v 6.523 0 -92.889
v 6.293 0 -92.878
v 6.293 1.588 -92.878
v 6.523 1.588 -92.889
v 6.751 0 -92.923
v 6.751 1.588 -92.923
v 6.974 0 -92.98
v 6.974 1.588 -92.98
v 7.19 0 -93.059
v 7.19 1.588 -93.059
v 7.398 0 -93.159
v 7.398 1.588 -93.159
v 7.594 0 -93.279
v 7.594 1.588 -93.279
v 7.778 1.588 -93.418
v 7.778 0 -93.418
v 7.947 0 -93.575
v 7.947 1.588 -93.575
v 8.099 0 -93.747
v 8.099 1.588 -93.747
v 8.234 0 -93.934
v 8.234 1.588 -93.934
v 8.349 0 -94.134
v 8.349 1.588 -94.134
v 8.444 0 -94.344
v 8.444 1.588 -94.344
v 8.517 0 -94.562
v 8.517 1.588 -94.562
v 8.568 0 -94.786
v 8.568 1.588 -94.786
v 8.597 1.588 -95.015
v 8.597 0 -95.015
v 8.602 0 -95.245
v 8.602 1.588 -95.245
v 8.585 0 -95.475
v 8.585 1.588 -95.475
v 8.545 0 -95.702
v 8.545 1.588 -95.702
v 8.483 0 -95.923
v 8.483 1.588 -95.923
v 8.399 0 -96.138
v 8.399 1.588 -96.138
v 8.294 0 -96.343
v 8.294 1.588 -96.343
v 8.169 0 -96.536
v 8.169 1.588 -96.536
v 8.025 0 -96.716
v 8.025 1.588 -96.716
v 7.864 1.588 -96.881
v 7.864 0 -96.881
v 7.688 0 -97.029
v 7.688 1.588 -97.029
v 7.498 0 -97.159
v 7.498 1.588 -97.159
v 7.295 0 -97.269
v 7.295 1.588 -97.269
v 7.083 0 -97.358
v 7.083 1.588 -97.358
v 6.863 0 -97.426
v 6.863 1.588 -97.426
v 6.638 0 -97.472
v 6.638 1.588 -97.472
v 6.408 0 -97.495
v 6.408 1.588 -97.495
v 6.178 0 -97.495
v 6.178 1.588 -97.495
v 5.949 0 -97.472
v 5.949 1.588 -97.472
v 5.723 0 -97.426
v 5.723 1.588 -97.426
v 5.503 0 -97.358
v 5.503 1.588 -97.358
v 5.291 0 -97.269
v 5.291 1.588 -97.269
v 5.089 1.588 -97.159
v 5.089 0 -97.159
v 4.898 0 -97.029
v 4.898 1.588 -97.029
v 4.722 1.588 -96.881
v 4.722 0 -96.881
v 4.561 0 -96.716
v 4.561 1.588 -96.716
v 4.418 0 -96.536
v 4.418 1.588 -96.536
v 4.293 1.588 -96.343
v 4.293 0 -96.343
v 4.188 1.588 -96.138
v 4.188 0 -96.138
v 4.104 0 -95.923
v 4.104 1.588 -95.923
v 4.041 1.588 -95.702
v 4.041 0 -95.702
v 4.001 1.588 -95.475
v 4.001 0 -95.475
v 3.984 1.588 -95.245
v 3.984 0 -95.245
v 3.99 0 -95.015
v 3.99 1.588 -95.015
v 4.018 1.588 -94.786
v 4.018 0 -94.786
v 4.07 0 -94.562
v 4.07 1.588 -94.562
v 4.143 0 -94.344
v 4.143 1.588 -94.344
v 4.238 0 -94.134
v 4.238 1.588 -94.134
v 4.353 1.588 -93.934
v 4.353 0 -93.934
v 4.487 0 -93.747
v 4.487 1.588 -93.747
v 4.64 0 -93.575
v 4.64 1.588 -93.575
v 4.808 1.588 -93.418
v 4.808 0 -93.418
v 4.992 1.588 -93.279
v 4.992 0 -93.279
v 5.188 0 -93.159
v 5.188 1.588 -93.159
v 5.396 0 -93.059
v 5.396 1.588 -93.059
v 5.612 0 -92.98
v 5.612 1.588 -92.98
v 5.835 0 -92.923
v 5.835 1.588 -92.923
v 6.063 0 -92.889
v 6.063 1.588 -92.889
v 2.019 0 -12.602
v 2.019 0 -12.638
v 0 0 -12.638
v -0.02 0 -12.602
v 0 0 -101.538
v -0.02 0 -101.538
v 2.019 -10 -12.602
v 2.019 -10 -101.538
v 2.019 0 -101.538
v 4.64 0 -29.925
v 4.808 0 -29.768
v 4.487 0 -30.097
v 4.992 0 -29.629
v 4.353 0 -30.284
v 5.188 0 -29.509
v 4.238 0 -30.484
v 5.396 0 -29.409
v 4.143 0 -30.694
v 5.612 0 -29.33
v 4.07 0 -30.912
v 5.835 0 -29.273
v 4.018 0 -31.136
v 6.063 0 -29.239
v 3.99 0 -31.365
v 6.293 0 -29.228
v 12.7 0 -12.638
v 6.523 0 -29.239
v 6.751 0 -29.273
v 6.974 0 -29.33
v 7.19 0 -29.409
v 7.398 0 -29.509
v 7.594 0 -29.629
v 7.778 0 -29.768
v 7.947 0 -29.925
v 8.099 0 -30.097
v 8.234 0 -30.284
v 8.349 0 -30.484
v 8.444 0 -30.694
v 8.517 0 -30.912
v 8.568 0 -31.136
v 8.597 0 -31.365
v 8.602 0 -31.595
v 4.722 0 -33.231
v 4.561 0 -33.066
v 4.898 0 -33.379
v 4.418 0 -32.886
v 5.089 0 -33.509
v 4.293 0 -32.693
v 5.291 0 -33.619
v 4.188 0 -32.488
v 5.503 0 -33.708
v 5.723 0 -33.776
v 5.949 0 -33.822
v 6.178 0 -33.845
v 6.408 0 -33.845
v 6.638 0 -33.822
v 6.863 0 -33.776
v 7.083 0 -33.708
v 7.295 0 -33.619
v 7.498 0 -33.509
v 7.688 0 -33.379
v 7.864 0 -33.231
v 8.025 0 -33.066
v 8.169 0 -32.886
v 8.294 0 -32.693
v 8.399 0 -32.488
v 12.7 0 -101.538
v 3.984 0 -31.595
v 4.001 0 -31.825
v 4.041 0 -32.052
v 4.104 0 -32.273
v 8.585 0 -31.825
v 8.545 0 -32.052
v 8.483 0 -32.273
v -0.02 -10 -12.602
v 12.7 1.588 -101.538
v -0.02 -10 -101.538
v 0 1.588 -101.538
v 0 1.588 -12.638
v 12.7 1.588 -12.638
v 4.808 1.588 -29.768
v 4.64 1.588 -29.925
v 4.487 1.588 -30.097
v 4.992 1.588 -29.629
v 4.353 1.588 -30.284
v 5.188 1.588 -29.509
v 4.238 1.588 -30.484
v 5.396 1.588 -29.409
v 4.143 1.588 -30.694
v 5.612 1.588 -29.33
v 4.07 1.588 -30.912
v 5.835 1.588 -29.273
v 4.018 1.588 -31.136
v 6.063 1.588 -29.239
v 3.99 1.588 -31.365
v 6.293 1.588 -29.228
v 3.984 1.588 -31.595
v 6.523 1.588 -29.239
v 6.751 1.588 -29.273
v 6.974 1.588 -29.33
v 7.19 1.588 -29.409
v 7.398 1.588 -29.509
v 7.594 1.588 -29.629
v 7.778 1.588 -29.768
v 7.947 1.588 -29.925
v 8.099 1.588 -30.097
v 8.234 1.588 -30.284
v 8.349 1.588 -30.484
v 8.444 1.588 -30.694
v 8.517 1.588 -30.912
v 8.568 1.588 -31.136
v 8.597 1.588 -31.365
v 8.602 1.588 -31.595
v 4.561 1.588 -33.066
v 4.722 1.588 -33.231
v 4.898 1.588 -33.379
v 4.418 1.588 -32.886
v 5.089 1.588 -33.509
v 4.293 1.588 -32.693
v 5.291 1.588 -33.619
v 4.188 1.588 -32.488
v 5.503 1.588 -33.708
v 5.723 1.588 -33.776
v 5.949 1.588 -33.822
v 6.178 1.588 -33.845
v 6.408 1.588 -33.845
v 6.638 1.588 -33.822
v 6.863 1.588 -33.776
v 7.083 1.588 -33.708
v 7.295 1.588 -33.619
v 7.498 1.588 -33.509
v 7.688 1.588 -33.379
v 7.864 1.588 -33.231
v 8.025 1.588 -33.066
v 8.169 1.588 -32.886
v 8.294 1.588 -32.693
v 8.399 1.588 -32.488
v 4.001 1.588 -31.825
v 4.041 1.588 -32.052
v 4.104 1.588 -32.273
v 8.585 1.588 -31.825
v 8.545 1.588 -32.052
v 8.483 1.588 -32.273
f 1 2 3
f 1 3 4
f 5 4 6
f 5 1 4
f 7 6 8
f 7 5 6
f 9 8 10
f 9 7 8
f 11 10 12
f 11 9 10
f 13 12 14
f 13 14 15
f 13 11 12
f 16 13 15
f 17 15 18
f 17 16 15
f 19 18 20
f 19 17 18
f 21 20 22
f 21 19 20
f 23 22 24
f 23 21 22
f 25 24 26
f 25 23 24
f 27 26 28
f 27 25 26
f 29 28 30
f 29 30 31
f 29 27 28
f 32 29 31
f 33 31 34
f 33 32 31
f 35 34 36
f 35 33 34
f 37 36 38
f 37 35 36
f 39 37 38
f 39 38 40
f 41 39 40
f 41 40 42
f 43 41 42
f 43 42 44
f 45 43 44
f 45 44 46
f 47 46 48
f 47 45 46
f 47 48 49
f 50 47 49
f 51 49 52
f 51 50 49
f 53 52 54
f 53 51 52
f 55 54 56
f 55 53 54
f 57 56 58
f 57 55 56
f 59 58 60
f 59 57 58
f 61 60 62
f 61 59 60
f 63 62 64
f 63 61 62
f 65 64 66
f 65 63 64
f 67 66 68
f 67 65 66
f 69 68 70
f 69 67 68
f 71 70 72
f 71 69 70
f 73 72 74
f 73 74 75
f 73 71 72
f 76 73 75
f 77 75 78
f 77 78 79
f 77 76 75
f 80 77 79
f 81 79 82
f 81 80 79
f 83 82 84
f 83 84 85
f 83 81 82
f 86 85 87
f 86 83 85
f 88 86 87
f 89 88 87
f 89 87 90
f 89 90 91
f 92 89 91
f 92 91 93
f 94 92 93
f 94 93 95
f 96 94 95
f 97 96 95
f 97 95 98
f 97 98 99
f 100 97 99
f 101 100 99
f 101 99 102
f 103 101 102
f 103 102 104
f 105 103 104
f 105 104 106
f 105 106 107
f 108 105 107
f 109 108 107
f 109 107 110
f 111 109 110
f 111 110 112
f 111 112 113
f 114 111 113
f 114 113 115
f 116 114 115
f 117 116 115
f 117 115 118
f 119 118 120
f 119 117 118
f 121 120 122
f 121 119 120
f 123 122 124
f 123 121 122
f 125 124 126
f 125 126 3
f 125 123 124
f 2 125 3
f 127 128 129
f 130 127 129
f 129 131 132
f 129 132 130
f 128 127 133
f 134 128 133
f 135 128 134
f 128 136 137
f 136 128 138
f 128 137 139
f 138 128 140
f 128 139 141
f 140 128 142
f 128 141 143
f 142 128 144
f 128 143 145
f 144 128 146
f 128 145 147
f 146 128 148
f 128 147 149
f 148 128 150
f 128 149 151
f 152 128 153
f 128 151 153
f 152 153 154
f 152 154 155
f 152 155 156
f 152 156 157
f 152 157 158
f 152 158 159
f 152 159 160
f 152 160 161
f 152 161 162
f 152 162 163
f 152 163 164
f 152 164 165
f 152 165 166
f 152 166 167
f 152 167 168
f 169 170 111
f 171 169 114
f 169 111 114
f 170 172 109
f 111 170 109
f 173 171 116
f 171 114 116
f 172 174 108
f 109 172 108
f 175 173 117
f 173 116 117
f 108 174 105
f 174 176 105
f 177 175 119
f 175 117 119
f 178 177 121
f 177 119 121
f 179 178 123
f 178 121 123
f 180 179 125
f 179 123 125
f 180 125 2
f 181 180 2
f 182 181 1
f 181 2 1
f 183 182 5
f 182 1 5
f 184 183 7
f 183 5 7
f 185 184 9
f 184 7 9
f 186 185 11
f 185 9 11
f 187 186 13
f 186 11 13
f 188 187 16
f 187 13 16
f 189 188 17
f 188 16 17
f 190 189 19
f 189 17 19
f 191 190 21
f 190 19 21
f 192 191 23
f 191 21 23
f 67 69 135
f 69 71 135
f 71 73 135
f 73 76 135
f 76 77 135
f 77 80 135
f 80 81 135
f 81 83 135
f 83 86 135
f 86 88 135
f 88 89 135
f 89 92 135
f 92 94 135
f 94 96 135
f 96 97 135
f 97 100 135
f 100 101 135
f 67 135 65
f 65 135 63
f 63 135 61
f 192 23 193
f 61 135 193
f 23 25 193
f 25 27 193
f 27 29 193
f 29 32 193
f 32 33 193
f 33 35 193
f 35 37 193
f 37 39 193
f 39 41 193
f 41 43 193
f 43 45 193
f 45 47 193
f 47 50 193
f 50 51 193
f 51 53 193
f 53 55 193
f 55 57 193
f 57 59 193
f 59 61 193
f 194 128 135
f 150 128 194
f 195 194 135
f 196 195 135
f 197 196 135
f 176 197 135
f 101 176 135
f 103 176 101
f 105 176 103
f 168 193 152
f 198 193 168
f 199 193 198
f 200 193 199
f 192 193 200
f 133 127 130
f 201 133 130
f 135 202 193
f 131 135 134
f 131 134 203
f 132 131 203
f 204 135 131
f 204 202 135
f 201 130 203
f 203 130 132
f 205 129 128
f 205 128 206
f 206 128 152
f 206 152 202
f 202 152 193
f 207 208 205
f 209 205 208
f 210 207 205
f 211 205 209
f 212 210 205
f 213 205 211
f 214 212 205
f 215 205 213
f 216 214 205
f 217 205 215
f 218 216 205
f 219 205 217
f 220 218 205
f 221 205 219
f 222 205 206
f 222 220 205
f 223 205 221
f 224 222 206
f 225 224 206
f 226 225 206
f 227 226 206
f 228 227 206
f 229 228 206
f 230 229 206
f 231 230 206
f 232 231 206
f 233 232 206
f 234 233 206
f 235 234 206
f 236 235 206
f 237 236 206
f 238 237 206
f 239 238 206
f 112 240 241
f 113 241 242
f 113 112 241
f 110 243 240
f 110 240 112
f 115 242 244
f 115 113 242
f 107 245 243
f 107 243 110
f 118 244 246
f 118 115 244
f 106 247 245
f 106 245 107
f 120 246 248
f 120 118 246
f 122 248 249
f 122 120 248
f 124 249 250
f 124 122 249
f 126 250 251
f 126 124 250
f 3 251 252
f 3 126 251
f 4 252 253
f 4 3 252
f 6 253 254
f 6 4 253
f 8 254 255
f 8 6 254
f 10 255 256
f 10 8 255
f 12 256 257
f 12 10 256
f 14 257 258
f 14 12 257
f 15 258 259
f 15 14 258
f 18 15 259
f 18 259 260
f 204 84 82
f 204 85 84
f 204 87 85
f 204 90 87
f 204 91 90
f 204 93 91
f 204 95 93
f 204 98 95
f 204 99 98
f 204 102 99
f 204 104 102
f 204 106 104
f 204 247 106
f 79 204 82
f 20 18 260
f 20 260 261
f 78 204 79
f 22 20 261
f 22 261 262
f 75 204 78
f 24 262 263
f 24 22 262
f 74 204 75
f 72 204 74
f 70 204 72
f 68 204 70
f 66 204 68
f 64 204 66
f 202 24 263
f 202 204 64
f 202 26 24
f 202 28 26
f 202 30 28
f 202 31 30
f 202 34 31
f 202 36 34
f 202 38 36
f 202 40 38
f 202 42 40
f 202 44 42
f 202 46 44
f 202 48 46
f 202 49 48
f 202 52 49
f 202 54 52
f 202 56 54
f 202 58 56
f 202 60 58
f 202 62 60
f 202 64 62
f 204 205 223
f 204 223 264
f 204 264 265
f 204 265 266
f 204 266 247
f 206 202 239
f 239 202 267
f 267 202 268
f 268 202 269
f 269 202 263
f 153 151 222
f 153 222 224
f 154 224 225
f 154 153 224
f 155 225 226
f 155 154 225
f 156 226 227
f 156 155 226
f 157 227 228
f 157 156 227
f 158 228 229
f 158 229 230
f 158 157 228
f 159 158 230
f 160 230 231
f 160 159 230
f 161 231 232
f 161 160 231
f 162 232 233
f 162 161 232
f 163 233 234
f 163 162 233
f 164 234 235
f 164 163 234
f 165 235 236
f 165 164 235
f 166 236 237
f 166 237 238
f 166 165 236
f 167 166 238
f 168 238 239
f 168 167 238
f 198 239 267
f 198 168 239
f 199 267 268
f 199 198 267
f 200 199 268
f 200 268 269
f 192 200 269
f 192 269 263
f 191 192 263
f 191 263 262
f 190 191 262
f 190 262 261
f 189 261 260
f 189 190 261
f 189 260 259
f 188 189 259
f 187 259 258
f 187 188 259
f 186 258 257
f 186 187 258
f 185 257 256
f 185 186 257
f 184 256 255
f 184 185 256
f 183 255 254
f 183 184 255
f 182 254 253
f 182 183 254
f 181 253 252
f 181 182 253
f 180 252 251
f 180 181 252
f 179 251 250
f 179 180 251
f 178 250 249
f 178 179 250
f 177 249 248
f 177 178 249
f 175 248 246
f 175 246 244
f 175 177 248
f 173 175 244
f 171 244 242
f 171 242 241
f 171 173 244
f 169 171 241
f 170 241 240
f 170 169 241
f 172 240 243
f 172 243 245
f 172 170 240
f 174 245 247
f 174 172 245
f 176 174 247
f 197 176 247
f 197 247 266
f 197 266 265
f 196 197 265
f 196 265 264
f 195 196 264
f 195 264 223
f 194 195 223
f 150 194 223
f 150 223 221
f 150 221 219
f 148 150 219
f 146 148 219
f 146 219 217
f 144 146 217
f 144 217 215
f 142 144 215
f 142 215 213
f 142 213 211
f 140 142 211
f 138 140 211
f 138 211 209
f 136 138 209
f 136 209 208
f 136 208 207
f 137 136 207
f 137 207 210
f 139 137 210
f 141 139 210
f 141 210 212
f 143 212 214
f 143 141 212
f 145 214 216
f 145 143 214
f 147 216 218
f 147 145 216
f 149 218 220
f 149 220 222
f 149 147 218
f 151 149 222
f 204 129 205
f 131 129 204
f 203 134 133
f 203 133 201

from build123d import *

# Parameters (mm, degrees)
SKETCH1_W           = 12.7
SKETCH1_H           = 88.9
SKETCH1_R           = 2.31
BOSS_EXTRUDE1_DEPTH = 1.5875
SKETCH3_W           = 2.038660884
SKETCH3_H           = 88.935455435
BOSS_EXTRUDE3_DEPTH = 10


with BuildPart() as part:
    # Sketch1 → Boss-Extrude1 (new body)
    with BuildSketch(Plane(origin=(0, 0, 0), x_dir=(1, 0, 0), z_dir=(0, 1, 0))):
        with Locations((6.35, 57.087542426)):
            Rectangle(SKETCH1_W, SKETCH1_H)
        with Locations(Location((6.293214881, 95.187542426, 0), (0, 0, 270))):
            Circle(SKETCH1_R, mode=Mode.SUBTRACT)
        with Locations(Location((6.293214881, 31.537542426, 0), (0, 0, 270))):
            Circle(SKETCH1_R, mode=Mode.SUBTRACT)
    extrude(amount=BOSS_EXTRUDE1_DEPTH)

    # Sketch3 → Boss-Extrude3 (add)
    with BuildSketch(Plane(origin=(0, 0, 0), x_dir=(-1, 0, 0), z_dir=(0, -1, 0))):
        with Locations((-0.999274051, 57.069814709)):
            Rectangle(SKETCH3_W, SKETCH3_H)
    extrude(amount=BOSS_EXTRUDE3_DEPTH)


solid = part.part
